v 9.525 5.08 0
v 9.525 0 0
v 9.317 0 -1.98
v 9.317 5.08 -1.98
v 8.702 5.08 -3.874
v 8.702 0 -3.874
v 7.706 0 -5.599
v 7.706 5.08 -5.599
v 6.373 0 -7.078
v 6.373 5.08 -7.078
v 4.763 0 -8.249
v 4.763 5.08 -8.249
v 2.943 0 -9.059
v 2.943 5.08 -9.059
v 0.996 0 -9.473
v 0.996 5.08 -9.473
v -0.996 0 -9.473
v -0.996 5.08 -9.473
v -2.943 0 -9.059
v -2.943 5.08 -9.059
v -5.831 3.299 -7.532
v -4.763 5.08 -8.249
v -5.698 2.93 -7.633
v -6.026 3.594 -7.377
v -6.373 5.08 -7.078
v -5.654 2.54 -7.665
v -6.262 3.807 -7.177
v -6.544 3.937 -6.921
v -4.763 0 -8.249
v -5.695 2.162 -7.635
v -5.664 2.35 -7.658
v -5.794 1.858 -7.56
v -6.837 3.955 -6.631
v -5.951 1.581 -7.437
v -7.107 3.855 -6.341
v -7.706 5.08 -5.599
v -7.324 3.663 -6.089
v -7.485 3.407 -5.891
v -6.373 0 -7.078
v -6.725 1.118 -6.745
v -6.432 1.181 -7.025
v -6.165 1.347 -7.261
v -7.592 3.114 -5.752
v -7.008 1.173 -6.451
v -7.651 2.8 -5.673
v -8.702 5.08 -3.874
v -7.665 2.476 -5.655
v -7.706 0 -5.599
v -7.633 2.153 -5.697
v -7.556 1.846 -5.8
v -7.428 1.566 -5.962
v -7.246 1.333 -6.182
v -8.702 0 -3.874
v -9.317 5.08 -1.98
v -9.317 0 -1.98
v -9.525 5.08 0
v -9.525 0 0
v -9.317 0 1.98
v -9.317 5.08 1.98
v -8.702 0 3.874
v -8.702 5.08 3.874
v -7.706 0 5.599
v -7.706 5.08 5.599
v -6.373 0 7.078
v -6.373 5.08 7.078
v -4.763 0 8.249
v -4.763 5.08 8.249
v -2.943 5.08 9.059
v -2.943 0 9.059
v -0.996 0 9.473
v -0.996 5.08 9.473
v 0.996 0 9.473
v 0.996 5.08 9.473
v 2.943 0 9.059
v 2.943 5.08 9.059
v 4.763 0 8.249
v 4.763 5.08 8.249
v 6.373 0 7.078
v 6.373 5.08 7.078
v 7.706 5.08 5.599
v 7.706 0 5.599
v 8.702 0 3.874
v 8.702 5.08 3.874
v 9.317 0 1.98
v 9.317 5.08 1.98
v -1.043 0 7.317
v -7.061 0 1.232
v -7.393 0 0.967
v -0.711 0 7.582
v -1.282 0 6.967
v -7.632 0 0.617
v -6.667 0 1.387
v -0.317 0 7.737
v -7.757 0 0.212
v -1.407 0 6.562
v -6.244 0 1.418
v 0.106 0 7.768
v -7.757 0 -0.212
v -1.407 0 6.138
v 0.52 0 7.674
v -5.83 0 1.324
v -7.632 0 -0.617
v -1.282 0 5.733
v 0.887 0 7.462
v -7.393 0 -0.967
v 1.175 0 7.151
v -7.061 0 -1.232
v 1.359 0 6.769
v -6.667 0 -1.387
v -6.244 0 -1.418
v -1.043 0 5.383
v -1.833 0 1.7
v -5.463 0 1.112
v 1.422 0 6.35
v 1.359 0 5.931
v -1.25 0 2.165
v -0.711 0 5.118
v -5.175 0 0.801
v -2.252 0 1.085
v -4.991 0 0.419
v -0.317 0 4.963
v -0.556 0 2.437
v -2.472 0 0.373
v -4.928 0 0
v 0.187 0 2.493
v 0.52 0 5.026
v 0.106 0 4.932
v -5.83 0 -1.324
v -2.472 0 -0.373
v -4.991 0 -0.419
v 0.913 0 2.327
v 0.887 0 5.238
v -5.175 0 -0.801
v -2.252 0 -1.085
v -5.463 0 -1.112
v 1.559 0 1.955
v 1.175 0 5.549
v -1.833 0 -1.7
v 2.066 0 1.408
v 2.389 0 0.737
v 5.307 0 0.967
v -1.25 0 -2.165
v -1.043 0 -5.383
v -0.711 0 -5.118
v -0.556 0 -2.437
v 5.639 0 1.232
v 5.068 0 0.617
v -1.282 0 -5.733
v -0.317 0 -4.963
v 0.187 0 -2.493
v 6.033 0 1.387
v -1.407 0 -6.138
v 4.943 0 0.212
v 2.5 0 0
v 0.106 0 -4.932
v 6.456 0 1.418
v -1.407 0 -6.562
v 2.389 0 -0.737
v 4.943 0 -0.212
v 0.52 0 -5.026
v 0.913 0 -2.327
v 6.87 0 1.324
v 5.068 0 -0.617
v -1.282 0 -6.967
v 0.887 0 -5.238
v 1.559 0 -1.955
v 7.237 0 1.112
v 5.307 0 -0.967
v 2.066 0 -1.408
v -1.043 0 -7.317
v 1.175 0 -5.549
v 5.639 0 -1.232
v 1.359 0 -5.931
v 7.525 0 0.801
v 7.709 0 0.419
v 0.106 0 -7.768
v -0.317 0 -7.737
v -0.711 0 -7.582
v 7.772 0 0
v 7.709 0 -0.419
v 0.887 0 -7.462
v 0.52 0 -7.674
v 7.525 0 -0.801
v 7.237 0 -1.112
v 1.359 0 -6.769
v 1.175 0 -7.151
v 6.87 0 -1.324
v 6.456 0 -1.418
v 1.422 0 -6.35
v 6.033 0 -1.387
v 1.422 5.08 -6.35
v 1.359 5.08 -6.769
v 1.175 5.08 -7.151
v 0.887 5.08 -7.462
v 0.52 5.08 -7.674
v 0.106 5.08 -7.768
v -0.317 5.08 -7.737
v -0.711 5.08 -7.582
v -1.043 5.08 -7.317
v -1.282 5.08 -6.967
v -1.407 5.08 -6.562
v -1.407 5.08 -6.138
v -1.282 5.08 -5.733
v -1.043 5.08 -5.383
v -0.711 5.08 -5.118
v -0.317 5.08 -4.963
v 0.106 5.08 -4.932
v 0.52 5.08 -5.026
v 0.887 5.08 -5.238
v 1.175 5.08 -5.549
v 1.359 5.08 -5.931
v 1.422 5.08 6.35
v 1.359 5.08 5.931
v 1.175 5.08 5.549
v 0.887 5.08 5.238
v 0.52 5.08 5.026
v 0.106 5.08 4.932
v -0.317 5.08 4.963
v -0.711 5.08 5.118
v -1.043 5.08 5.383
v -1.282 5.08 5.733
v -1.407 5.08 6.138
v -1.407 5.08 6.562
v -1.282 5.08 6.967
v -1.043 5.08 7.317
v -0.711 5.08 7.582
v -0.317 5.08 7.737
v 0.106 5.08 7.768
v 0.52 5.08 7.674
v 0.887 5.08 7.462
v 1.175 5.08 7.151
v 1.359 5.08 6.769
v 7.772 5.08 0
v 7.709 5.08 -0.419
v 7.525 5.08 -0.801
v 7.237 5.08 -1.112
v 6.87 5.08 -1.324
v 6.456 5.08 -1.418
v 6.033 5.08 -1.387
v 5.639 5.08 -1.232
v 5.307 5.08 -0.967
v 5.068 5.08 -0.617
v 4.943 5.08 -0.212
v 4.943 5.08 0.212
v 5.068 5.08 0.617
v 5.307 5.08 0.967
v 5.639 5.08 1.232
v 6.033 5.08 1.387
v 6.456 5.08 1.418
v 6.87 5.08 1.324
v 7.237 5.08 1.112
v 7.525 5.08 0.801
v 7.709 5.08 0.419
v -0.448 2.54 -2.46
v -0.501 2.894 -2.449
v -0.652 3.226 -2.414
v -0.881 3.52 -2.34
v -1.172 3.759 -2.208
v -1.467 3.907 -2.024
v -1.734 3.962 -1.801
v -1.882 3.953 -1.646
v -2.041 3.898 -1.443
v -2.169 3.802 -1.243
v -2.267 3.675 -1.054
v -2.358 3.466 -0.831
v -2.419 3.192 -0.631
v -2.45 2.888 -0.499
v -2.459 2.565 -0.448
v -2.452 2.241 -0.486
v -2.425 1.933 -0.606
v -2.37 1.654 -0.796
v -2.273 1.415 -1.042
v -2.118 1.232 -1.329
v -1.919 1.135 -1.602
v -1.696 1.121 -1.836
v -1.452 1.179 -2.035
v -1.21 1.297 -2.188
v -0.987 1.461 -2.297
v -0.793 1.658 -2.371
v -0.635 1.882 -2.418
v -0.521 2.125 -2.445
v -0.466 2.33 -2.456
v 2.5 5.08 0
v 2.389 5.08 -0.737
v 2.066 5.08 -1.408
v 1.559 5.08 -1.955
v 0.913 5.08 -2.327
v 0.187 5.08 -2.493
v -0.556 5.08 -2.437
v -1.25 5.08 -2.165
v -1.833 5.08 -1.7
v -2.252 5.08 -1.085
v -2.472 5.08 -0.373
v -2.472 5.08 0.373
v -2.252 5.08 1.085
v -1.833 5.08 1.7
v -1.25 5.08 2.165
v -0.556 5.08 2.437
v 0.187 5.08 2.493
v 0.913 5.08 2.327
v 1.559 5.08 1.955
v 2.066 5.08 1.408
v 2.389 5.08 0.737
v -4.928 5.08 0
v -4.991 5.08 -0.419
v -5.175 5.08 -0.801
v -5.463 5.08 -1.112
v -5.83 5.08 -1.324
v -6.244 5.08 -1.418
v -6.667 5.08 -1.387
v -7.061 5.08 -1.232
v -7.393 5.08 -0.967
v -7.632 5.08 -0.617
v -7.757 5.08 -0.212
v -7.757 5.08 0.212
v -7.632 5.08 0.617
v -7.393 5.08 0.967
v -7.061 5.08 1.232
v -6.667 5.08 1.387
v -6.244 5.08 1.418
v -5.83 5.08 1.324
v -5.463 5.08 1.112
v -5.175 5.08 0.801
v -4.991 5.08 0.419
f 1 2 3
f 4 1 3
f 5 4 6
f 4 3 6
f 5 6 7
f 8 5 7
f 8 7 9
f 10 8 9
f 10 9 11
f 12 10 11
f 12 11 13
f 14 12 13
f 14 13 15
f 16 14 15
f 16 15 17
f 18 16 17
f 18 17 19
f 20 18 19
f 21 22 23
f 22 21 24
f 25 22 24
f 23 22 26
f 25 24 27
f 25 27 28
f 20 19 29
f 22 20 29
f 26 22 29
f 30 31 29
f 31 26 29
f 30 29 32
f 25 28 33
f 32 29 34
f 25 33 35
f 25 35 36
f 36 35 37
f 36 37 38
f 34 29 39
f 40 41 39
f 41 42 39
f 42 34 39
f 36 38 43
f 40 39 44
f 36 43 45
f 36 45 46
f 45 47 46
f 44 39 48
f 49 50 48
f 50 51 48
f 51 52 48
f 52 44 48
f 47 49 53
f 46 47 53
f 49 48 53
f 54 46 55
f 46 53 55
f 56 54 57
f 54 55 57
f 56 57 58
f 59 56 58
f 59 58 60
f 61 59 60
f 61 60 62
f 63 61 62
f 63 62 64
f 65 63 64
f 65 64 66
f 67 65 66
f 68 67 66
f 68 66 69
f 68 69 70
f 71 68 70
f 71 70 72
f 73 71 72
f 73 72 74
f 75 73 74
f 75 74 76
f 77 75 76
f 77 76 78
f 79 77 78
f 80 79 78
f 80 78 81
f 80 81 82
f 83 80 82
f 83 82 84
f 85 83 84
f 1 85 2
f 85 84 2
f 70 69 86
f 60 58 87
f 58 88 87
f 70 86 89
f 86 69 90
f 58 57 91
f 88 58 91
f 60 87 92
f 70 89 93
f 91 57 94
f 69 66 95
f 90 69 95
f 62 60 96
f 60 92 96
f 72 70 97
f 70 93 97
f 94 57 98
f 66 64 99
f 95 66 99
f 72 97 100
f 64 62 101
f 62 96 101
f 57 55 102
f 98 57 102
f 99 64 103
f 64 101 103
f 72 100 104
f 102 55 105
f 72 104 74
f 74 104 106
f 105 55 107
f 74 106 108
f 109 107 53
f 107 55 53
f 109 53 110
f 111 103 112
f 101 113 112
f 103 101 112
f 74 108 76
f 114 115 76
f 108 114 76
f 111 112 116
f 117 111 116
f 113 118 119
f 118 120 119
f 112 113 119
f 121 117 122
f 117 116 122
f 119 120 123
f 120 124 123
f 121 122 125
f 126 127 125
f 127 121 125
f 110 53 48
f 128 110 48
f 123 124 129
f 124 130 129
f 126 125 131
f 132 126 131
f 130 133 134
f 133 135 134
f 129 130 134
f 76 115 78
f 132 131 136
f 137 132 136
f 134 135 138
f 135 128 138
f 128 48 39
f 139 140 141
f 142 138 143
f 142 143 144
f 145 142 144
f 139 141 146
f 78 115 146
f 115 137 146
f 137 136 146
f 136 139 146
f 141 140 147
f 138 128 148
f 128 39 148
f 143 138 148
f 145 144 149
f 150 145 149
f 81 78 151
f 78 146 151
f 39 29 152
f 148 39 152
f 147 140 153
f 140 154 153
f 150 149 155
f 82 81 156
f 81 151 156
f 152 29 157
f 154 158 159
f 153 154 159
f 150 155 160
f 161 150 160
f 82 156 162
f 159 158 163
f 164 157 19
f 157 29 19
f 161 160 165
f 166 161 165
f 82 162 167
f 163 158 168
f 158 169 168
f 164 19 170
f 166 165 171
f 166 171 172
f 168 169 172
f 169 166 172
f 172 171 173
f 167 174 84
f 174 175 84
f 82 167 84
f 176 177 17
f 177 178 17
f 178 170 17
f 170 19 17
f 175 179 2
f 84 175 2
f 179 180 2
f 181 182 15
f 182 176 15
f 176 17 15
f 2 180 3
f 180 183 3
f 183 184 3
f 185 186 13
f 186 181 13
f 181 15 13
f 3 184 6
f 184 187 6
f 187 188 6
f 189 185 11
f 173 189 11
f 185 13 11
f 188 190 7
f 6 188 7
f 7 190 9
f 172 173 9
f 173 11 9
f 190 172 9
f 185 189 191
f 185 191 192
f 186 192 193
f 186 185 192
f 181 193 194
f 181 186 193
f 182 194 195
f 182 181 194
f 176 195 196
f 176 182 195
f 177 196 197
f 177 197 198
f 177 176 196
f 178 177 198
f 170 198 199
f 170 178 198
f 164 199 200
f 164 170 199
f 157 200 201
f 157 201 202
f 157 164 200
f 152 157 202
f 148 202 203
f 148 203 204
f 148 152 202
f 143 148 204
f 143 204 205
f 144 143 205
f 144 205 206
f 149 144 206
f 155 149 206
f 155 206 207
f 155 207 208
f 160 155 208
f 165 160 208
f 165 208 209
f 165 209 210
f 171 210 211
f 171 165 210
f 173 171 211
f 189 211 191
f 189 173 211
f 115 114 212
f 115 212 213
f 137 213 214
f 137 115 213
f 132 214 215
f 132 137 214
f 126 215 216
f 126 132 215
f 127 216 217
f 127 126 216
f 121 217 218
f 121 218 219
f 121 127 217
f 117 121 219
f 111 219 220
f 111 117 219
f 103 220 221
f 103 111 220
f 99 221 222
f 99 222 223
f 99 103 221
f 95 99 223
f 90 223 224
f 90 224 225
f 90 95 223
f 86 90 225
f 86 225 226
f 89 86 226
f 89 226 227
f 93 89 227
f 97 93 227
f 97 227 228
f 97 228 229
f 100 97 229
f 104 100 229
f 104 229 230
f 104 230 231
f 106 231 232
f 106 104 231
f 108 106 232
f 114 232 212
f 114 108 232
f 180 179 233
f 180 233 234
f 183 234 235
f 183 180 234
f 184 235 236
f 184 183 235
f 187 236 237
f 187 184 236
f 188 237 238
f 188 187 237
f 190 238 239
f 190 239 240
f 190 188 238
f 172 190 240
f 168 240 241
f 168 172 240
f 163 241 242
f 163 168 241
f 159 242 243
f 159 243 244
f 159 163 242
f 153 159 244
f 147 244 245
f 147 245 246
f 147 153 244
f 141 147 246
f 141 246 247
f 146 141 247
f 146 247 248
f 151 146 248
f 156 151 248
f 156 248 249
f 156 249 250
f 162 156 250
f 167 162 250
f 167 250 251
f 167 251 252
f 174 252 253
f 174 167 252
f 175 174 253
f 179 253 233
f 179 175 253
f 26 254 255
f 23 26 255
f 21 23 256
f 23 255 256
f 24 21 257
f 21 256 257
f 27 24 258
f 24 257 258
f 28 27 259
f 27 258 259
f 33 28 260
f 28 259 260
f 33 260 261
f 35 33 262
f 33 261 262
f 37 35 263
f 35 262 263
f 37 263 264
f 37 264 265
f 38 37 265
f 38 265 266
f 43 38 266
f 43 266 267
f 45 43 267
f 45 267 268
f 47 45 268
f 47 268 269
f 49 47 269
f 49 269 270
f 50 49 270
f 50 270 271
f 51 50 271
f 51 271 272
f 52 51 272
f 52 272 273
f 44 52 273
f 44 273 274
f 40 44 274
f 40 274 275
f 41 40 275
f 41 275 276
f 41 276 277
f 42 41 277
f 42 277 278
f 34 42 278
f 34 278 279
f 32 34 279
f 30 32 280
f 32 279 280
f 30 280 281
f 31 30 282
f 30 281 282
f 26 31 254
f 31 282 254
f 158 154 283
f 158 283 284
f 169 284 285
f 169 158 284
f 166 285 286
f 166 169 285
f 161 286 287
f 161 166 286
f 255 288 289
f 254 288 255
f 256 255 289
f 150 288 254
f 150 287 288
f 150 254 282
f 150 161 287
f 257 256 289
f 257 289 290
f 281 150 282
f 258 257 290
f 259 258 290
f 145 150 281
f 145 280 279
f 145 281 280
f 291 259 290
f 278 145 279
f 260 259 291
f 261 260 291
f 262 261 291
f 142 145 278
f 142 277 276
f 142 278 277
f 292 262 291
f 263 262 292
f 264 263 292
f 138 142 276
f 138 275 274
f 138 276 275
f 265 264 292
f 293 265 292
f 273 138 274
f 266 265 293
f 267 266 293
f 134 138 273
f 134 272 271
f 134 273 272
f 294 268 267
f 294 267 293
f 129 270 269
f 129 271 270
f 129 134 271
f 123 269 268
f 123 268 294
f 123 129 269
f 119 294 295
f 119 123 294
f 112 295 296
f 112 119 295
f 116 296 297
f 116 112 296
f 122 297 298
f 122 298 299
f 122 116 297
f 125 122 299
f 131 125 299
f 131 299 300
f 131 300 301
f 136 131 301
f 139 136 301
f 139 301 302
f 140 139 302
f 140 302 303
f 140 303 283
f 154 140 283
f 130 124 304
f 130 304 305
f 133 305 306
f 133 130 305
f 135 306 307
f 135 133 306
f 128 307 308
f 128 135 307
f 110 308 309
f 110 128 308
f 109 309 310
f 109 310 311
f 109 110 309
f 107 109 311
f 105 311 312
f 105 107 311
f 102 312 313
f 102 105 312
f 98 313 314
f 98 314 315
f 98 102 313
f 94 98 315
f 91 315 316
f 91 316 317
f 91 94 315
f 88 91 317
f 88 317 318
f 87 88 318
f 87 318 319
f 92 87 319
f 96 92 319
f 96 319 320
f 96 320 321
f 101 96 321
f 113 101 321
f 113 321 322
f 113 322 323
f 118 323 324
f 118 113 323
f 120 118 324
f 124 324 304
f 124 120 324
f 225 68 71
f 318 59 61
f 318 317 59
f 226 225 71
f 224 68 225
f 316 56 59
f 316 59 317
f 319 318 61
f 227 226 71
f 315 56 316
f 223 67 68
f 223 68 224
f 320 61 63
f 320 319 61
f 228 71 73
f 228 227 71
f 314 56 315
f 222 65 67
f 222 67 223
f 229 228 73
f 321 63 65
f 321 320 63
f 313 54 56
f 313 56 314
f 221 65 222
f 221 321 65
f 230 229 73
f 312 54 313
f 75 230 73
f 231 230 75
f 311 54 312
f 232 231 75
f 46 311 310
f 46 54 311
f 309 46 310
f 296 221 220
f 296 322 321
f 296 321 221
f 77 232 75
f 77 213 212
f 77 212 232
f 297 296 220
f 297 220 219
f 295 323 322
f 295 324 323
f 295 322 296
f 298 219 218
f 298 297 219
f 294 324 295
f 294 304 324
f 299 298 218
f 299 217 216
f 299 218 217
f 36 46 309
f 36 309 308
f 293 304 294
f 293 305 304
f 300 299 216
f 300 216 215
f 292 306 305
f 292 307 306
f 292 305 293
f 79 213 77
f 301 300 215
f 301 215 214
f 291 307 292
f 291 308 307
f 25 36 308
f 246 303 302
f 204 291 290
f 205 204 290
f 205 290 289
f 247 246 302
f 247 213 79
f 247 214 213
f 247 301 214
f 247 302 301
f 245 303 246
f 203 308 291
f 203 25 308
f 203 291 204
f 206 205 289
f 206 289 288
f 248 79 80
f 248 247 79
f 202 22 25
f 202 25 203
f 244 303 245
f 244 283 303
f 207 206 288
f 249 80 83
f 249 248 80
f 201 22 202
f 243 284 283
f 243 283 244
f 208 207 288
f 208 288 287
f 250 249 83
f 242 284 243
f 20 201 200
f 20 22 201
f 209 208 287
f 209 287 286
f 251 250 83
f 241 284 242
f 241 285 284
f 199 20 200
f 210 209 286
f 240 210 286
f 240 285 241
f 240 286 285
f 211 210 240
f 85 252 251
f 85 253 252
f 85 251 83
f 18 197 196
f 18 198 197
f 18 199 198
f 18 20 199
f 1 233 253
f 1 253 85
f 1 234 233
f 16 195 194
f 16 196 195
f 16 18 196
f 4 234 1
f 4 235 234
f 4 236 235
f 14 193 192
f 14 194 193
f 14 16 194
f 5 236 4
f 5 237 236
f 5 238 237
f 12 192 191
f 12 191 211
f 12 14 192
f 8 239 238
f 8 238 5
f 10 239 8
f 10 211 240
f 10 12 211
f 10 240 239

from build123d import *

# Parameters (mm, degrees)
SKETCH2_R           = 9.525
SKETCH2_R_2         = 1.4224
SKETCH2_R_3         = 2.5
BOSS_EXTRUDE1_DEPTH = 5.08
CUT_EXTRUDE1_REACH  = 15.47
SKETCH7_R           = 1.4224


with BuildPart() as part:
    # Sketch2 → Boss-Extrude1 (new body)
    with BuildSketch(Plane(origin=(0, 0, 0), x_dir=(1, 0, 0), z_dir=(0, 1, 0))):
        Circle(SKETCH2_R)
        with Locations((0, 6.35)):
            Circle(SKETCH2_R_2, mode=Mode.SUBTRACT)
        with Locations((6.35, 0)):
            Circle(SKETCH2_R_2, mode=Mode.SUBTRACT)
        with Locations((0, -6.35)):
            Circle(SKETCH2_R_2, mode=Mode.SUBTRACT)
        with Locations((-6.35, 0)):
            Circle(SKETCH2_R_2, mode=Mode.SUBTRACT)
        Circle(SKETCH2_R_3, mode=Mode.SUBTRACT)
    extrude(amount=BOSS_EXTRUDE1_DEPTH)

    # Sketch7 → Cut-Extrude1 (cut, up to next)
    with BuildSketch(Plane(origin=(0, 0, 0), x_dir=(0.707106781, 0, -0.707106781), z_dir=(0.707106781, 0, 0.707106781)), mode=Mode.PRIVATE) as cut_extrude1_sk1:
        with Locations((0, 2.54)):
            Circle(SKETCH7_R)
    cut_extrude1_tool1 = extrude(cut_extrude1_sk1.sketch, amount=-CUT_EXTRUDE1_REACH, mode=Mode.PRIVATE) & part.part
    add(cut_extrude1_tool1.solids().sort_by_distance((0, 2.54, 0))[0], mode=Mode.SUBTRACT)


solid = part.part
